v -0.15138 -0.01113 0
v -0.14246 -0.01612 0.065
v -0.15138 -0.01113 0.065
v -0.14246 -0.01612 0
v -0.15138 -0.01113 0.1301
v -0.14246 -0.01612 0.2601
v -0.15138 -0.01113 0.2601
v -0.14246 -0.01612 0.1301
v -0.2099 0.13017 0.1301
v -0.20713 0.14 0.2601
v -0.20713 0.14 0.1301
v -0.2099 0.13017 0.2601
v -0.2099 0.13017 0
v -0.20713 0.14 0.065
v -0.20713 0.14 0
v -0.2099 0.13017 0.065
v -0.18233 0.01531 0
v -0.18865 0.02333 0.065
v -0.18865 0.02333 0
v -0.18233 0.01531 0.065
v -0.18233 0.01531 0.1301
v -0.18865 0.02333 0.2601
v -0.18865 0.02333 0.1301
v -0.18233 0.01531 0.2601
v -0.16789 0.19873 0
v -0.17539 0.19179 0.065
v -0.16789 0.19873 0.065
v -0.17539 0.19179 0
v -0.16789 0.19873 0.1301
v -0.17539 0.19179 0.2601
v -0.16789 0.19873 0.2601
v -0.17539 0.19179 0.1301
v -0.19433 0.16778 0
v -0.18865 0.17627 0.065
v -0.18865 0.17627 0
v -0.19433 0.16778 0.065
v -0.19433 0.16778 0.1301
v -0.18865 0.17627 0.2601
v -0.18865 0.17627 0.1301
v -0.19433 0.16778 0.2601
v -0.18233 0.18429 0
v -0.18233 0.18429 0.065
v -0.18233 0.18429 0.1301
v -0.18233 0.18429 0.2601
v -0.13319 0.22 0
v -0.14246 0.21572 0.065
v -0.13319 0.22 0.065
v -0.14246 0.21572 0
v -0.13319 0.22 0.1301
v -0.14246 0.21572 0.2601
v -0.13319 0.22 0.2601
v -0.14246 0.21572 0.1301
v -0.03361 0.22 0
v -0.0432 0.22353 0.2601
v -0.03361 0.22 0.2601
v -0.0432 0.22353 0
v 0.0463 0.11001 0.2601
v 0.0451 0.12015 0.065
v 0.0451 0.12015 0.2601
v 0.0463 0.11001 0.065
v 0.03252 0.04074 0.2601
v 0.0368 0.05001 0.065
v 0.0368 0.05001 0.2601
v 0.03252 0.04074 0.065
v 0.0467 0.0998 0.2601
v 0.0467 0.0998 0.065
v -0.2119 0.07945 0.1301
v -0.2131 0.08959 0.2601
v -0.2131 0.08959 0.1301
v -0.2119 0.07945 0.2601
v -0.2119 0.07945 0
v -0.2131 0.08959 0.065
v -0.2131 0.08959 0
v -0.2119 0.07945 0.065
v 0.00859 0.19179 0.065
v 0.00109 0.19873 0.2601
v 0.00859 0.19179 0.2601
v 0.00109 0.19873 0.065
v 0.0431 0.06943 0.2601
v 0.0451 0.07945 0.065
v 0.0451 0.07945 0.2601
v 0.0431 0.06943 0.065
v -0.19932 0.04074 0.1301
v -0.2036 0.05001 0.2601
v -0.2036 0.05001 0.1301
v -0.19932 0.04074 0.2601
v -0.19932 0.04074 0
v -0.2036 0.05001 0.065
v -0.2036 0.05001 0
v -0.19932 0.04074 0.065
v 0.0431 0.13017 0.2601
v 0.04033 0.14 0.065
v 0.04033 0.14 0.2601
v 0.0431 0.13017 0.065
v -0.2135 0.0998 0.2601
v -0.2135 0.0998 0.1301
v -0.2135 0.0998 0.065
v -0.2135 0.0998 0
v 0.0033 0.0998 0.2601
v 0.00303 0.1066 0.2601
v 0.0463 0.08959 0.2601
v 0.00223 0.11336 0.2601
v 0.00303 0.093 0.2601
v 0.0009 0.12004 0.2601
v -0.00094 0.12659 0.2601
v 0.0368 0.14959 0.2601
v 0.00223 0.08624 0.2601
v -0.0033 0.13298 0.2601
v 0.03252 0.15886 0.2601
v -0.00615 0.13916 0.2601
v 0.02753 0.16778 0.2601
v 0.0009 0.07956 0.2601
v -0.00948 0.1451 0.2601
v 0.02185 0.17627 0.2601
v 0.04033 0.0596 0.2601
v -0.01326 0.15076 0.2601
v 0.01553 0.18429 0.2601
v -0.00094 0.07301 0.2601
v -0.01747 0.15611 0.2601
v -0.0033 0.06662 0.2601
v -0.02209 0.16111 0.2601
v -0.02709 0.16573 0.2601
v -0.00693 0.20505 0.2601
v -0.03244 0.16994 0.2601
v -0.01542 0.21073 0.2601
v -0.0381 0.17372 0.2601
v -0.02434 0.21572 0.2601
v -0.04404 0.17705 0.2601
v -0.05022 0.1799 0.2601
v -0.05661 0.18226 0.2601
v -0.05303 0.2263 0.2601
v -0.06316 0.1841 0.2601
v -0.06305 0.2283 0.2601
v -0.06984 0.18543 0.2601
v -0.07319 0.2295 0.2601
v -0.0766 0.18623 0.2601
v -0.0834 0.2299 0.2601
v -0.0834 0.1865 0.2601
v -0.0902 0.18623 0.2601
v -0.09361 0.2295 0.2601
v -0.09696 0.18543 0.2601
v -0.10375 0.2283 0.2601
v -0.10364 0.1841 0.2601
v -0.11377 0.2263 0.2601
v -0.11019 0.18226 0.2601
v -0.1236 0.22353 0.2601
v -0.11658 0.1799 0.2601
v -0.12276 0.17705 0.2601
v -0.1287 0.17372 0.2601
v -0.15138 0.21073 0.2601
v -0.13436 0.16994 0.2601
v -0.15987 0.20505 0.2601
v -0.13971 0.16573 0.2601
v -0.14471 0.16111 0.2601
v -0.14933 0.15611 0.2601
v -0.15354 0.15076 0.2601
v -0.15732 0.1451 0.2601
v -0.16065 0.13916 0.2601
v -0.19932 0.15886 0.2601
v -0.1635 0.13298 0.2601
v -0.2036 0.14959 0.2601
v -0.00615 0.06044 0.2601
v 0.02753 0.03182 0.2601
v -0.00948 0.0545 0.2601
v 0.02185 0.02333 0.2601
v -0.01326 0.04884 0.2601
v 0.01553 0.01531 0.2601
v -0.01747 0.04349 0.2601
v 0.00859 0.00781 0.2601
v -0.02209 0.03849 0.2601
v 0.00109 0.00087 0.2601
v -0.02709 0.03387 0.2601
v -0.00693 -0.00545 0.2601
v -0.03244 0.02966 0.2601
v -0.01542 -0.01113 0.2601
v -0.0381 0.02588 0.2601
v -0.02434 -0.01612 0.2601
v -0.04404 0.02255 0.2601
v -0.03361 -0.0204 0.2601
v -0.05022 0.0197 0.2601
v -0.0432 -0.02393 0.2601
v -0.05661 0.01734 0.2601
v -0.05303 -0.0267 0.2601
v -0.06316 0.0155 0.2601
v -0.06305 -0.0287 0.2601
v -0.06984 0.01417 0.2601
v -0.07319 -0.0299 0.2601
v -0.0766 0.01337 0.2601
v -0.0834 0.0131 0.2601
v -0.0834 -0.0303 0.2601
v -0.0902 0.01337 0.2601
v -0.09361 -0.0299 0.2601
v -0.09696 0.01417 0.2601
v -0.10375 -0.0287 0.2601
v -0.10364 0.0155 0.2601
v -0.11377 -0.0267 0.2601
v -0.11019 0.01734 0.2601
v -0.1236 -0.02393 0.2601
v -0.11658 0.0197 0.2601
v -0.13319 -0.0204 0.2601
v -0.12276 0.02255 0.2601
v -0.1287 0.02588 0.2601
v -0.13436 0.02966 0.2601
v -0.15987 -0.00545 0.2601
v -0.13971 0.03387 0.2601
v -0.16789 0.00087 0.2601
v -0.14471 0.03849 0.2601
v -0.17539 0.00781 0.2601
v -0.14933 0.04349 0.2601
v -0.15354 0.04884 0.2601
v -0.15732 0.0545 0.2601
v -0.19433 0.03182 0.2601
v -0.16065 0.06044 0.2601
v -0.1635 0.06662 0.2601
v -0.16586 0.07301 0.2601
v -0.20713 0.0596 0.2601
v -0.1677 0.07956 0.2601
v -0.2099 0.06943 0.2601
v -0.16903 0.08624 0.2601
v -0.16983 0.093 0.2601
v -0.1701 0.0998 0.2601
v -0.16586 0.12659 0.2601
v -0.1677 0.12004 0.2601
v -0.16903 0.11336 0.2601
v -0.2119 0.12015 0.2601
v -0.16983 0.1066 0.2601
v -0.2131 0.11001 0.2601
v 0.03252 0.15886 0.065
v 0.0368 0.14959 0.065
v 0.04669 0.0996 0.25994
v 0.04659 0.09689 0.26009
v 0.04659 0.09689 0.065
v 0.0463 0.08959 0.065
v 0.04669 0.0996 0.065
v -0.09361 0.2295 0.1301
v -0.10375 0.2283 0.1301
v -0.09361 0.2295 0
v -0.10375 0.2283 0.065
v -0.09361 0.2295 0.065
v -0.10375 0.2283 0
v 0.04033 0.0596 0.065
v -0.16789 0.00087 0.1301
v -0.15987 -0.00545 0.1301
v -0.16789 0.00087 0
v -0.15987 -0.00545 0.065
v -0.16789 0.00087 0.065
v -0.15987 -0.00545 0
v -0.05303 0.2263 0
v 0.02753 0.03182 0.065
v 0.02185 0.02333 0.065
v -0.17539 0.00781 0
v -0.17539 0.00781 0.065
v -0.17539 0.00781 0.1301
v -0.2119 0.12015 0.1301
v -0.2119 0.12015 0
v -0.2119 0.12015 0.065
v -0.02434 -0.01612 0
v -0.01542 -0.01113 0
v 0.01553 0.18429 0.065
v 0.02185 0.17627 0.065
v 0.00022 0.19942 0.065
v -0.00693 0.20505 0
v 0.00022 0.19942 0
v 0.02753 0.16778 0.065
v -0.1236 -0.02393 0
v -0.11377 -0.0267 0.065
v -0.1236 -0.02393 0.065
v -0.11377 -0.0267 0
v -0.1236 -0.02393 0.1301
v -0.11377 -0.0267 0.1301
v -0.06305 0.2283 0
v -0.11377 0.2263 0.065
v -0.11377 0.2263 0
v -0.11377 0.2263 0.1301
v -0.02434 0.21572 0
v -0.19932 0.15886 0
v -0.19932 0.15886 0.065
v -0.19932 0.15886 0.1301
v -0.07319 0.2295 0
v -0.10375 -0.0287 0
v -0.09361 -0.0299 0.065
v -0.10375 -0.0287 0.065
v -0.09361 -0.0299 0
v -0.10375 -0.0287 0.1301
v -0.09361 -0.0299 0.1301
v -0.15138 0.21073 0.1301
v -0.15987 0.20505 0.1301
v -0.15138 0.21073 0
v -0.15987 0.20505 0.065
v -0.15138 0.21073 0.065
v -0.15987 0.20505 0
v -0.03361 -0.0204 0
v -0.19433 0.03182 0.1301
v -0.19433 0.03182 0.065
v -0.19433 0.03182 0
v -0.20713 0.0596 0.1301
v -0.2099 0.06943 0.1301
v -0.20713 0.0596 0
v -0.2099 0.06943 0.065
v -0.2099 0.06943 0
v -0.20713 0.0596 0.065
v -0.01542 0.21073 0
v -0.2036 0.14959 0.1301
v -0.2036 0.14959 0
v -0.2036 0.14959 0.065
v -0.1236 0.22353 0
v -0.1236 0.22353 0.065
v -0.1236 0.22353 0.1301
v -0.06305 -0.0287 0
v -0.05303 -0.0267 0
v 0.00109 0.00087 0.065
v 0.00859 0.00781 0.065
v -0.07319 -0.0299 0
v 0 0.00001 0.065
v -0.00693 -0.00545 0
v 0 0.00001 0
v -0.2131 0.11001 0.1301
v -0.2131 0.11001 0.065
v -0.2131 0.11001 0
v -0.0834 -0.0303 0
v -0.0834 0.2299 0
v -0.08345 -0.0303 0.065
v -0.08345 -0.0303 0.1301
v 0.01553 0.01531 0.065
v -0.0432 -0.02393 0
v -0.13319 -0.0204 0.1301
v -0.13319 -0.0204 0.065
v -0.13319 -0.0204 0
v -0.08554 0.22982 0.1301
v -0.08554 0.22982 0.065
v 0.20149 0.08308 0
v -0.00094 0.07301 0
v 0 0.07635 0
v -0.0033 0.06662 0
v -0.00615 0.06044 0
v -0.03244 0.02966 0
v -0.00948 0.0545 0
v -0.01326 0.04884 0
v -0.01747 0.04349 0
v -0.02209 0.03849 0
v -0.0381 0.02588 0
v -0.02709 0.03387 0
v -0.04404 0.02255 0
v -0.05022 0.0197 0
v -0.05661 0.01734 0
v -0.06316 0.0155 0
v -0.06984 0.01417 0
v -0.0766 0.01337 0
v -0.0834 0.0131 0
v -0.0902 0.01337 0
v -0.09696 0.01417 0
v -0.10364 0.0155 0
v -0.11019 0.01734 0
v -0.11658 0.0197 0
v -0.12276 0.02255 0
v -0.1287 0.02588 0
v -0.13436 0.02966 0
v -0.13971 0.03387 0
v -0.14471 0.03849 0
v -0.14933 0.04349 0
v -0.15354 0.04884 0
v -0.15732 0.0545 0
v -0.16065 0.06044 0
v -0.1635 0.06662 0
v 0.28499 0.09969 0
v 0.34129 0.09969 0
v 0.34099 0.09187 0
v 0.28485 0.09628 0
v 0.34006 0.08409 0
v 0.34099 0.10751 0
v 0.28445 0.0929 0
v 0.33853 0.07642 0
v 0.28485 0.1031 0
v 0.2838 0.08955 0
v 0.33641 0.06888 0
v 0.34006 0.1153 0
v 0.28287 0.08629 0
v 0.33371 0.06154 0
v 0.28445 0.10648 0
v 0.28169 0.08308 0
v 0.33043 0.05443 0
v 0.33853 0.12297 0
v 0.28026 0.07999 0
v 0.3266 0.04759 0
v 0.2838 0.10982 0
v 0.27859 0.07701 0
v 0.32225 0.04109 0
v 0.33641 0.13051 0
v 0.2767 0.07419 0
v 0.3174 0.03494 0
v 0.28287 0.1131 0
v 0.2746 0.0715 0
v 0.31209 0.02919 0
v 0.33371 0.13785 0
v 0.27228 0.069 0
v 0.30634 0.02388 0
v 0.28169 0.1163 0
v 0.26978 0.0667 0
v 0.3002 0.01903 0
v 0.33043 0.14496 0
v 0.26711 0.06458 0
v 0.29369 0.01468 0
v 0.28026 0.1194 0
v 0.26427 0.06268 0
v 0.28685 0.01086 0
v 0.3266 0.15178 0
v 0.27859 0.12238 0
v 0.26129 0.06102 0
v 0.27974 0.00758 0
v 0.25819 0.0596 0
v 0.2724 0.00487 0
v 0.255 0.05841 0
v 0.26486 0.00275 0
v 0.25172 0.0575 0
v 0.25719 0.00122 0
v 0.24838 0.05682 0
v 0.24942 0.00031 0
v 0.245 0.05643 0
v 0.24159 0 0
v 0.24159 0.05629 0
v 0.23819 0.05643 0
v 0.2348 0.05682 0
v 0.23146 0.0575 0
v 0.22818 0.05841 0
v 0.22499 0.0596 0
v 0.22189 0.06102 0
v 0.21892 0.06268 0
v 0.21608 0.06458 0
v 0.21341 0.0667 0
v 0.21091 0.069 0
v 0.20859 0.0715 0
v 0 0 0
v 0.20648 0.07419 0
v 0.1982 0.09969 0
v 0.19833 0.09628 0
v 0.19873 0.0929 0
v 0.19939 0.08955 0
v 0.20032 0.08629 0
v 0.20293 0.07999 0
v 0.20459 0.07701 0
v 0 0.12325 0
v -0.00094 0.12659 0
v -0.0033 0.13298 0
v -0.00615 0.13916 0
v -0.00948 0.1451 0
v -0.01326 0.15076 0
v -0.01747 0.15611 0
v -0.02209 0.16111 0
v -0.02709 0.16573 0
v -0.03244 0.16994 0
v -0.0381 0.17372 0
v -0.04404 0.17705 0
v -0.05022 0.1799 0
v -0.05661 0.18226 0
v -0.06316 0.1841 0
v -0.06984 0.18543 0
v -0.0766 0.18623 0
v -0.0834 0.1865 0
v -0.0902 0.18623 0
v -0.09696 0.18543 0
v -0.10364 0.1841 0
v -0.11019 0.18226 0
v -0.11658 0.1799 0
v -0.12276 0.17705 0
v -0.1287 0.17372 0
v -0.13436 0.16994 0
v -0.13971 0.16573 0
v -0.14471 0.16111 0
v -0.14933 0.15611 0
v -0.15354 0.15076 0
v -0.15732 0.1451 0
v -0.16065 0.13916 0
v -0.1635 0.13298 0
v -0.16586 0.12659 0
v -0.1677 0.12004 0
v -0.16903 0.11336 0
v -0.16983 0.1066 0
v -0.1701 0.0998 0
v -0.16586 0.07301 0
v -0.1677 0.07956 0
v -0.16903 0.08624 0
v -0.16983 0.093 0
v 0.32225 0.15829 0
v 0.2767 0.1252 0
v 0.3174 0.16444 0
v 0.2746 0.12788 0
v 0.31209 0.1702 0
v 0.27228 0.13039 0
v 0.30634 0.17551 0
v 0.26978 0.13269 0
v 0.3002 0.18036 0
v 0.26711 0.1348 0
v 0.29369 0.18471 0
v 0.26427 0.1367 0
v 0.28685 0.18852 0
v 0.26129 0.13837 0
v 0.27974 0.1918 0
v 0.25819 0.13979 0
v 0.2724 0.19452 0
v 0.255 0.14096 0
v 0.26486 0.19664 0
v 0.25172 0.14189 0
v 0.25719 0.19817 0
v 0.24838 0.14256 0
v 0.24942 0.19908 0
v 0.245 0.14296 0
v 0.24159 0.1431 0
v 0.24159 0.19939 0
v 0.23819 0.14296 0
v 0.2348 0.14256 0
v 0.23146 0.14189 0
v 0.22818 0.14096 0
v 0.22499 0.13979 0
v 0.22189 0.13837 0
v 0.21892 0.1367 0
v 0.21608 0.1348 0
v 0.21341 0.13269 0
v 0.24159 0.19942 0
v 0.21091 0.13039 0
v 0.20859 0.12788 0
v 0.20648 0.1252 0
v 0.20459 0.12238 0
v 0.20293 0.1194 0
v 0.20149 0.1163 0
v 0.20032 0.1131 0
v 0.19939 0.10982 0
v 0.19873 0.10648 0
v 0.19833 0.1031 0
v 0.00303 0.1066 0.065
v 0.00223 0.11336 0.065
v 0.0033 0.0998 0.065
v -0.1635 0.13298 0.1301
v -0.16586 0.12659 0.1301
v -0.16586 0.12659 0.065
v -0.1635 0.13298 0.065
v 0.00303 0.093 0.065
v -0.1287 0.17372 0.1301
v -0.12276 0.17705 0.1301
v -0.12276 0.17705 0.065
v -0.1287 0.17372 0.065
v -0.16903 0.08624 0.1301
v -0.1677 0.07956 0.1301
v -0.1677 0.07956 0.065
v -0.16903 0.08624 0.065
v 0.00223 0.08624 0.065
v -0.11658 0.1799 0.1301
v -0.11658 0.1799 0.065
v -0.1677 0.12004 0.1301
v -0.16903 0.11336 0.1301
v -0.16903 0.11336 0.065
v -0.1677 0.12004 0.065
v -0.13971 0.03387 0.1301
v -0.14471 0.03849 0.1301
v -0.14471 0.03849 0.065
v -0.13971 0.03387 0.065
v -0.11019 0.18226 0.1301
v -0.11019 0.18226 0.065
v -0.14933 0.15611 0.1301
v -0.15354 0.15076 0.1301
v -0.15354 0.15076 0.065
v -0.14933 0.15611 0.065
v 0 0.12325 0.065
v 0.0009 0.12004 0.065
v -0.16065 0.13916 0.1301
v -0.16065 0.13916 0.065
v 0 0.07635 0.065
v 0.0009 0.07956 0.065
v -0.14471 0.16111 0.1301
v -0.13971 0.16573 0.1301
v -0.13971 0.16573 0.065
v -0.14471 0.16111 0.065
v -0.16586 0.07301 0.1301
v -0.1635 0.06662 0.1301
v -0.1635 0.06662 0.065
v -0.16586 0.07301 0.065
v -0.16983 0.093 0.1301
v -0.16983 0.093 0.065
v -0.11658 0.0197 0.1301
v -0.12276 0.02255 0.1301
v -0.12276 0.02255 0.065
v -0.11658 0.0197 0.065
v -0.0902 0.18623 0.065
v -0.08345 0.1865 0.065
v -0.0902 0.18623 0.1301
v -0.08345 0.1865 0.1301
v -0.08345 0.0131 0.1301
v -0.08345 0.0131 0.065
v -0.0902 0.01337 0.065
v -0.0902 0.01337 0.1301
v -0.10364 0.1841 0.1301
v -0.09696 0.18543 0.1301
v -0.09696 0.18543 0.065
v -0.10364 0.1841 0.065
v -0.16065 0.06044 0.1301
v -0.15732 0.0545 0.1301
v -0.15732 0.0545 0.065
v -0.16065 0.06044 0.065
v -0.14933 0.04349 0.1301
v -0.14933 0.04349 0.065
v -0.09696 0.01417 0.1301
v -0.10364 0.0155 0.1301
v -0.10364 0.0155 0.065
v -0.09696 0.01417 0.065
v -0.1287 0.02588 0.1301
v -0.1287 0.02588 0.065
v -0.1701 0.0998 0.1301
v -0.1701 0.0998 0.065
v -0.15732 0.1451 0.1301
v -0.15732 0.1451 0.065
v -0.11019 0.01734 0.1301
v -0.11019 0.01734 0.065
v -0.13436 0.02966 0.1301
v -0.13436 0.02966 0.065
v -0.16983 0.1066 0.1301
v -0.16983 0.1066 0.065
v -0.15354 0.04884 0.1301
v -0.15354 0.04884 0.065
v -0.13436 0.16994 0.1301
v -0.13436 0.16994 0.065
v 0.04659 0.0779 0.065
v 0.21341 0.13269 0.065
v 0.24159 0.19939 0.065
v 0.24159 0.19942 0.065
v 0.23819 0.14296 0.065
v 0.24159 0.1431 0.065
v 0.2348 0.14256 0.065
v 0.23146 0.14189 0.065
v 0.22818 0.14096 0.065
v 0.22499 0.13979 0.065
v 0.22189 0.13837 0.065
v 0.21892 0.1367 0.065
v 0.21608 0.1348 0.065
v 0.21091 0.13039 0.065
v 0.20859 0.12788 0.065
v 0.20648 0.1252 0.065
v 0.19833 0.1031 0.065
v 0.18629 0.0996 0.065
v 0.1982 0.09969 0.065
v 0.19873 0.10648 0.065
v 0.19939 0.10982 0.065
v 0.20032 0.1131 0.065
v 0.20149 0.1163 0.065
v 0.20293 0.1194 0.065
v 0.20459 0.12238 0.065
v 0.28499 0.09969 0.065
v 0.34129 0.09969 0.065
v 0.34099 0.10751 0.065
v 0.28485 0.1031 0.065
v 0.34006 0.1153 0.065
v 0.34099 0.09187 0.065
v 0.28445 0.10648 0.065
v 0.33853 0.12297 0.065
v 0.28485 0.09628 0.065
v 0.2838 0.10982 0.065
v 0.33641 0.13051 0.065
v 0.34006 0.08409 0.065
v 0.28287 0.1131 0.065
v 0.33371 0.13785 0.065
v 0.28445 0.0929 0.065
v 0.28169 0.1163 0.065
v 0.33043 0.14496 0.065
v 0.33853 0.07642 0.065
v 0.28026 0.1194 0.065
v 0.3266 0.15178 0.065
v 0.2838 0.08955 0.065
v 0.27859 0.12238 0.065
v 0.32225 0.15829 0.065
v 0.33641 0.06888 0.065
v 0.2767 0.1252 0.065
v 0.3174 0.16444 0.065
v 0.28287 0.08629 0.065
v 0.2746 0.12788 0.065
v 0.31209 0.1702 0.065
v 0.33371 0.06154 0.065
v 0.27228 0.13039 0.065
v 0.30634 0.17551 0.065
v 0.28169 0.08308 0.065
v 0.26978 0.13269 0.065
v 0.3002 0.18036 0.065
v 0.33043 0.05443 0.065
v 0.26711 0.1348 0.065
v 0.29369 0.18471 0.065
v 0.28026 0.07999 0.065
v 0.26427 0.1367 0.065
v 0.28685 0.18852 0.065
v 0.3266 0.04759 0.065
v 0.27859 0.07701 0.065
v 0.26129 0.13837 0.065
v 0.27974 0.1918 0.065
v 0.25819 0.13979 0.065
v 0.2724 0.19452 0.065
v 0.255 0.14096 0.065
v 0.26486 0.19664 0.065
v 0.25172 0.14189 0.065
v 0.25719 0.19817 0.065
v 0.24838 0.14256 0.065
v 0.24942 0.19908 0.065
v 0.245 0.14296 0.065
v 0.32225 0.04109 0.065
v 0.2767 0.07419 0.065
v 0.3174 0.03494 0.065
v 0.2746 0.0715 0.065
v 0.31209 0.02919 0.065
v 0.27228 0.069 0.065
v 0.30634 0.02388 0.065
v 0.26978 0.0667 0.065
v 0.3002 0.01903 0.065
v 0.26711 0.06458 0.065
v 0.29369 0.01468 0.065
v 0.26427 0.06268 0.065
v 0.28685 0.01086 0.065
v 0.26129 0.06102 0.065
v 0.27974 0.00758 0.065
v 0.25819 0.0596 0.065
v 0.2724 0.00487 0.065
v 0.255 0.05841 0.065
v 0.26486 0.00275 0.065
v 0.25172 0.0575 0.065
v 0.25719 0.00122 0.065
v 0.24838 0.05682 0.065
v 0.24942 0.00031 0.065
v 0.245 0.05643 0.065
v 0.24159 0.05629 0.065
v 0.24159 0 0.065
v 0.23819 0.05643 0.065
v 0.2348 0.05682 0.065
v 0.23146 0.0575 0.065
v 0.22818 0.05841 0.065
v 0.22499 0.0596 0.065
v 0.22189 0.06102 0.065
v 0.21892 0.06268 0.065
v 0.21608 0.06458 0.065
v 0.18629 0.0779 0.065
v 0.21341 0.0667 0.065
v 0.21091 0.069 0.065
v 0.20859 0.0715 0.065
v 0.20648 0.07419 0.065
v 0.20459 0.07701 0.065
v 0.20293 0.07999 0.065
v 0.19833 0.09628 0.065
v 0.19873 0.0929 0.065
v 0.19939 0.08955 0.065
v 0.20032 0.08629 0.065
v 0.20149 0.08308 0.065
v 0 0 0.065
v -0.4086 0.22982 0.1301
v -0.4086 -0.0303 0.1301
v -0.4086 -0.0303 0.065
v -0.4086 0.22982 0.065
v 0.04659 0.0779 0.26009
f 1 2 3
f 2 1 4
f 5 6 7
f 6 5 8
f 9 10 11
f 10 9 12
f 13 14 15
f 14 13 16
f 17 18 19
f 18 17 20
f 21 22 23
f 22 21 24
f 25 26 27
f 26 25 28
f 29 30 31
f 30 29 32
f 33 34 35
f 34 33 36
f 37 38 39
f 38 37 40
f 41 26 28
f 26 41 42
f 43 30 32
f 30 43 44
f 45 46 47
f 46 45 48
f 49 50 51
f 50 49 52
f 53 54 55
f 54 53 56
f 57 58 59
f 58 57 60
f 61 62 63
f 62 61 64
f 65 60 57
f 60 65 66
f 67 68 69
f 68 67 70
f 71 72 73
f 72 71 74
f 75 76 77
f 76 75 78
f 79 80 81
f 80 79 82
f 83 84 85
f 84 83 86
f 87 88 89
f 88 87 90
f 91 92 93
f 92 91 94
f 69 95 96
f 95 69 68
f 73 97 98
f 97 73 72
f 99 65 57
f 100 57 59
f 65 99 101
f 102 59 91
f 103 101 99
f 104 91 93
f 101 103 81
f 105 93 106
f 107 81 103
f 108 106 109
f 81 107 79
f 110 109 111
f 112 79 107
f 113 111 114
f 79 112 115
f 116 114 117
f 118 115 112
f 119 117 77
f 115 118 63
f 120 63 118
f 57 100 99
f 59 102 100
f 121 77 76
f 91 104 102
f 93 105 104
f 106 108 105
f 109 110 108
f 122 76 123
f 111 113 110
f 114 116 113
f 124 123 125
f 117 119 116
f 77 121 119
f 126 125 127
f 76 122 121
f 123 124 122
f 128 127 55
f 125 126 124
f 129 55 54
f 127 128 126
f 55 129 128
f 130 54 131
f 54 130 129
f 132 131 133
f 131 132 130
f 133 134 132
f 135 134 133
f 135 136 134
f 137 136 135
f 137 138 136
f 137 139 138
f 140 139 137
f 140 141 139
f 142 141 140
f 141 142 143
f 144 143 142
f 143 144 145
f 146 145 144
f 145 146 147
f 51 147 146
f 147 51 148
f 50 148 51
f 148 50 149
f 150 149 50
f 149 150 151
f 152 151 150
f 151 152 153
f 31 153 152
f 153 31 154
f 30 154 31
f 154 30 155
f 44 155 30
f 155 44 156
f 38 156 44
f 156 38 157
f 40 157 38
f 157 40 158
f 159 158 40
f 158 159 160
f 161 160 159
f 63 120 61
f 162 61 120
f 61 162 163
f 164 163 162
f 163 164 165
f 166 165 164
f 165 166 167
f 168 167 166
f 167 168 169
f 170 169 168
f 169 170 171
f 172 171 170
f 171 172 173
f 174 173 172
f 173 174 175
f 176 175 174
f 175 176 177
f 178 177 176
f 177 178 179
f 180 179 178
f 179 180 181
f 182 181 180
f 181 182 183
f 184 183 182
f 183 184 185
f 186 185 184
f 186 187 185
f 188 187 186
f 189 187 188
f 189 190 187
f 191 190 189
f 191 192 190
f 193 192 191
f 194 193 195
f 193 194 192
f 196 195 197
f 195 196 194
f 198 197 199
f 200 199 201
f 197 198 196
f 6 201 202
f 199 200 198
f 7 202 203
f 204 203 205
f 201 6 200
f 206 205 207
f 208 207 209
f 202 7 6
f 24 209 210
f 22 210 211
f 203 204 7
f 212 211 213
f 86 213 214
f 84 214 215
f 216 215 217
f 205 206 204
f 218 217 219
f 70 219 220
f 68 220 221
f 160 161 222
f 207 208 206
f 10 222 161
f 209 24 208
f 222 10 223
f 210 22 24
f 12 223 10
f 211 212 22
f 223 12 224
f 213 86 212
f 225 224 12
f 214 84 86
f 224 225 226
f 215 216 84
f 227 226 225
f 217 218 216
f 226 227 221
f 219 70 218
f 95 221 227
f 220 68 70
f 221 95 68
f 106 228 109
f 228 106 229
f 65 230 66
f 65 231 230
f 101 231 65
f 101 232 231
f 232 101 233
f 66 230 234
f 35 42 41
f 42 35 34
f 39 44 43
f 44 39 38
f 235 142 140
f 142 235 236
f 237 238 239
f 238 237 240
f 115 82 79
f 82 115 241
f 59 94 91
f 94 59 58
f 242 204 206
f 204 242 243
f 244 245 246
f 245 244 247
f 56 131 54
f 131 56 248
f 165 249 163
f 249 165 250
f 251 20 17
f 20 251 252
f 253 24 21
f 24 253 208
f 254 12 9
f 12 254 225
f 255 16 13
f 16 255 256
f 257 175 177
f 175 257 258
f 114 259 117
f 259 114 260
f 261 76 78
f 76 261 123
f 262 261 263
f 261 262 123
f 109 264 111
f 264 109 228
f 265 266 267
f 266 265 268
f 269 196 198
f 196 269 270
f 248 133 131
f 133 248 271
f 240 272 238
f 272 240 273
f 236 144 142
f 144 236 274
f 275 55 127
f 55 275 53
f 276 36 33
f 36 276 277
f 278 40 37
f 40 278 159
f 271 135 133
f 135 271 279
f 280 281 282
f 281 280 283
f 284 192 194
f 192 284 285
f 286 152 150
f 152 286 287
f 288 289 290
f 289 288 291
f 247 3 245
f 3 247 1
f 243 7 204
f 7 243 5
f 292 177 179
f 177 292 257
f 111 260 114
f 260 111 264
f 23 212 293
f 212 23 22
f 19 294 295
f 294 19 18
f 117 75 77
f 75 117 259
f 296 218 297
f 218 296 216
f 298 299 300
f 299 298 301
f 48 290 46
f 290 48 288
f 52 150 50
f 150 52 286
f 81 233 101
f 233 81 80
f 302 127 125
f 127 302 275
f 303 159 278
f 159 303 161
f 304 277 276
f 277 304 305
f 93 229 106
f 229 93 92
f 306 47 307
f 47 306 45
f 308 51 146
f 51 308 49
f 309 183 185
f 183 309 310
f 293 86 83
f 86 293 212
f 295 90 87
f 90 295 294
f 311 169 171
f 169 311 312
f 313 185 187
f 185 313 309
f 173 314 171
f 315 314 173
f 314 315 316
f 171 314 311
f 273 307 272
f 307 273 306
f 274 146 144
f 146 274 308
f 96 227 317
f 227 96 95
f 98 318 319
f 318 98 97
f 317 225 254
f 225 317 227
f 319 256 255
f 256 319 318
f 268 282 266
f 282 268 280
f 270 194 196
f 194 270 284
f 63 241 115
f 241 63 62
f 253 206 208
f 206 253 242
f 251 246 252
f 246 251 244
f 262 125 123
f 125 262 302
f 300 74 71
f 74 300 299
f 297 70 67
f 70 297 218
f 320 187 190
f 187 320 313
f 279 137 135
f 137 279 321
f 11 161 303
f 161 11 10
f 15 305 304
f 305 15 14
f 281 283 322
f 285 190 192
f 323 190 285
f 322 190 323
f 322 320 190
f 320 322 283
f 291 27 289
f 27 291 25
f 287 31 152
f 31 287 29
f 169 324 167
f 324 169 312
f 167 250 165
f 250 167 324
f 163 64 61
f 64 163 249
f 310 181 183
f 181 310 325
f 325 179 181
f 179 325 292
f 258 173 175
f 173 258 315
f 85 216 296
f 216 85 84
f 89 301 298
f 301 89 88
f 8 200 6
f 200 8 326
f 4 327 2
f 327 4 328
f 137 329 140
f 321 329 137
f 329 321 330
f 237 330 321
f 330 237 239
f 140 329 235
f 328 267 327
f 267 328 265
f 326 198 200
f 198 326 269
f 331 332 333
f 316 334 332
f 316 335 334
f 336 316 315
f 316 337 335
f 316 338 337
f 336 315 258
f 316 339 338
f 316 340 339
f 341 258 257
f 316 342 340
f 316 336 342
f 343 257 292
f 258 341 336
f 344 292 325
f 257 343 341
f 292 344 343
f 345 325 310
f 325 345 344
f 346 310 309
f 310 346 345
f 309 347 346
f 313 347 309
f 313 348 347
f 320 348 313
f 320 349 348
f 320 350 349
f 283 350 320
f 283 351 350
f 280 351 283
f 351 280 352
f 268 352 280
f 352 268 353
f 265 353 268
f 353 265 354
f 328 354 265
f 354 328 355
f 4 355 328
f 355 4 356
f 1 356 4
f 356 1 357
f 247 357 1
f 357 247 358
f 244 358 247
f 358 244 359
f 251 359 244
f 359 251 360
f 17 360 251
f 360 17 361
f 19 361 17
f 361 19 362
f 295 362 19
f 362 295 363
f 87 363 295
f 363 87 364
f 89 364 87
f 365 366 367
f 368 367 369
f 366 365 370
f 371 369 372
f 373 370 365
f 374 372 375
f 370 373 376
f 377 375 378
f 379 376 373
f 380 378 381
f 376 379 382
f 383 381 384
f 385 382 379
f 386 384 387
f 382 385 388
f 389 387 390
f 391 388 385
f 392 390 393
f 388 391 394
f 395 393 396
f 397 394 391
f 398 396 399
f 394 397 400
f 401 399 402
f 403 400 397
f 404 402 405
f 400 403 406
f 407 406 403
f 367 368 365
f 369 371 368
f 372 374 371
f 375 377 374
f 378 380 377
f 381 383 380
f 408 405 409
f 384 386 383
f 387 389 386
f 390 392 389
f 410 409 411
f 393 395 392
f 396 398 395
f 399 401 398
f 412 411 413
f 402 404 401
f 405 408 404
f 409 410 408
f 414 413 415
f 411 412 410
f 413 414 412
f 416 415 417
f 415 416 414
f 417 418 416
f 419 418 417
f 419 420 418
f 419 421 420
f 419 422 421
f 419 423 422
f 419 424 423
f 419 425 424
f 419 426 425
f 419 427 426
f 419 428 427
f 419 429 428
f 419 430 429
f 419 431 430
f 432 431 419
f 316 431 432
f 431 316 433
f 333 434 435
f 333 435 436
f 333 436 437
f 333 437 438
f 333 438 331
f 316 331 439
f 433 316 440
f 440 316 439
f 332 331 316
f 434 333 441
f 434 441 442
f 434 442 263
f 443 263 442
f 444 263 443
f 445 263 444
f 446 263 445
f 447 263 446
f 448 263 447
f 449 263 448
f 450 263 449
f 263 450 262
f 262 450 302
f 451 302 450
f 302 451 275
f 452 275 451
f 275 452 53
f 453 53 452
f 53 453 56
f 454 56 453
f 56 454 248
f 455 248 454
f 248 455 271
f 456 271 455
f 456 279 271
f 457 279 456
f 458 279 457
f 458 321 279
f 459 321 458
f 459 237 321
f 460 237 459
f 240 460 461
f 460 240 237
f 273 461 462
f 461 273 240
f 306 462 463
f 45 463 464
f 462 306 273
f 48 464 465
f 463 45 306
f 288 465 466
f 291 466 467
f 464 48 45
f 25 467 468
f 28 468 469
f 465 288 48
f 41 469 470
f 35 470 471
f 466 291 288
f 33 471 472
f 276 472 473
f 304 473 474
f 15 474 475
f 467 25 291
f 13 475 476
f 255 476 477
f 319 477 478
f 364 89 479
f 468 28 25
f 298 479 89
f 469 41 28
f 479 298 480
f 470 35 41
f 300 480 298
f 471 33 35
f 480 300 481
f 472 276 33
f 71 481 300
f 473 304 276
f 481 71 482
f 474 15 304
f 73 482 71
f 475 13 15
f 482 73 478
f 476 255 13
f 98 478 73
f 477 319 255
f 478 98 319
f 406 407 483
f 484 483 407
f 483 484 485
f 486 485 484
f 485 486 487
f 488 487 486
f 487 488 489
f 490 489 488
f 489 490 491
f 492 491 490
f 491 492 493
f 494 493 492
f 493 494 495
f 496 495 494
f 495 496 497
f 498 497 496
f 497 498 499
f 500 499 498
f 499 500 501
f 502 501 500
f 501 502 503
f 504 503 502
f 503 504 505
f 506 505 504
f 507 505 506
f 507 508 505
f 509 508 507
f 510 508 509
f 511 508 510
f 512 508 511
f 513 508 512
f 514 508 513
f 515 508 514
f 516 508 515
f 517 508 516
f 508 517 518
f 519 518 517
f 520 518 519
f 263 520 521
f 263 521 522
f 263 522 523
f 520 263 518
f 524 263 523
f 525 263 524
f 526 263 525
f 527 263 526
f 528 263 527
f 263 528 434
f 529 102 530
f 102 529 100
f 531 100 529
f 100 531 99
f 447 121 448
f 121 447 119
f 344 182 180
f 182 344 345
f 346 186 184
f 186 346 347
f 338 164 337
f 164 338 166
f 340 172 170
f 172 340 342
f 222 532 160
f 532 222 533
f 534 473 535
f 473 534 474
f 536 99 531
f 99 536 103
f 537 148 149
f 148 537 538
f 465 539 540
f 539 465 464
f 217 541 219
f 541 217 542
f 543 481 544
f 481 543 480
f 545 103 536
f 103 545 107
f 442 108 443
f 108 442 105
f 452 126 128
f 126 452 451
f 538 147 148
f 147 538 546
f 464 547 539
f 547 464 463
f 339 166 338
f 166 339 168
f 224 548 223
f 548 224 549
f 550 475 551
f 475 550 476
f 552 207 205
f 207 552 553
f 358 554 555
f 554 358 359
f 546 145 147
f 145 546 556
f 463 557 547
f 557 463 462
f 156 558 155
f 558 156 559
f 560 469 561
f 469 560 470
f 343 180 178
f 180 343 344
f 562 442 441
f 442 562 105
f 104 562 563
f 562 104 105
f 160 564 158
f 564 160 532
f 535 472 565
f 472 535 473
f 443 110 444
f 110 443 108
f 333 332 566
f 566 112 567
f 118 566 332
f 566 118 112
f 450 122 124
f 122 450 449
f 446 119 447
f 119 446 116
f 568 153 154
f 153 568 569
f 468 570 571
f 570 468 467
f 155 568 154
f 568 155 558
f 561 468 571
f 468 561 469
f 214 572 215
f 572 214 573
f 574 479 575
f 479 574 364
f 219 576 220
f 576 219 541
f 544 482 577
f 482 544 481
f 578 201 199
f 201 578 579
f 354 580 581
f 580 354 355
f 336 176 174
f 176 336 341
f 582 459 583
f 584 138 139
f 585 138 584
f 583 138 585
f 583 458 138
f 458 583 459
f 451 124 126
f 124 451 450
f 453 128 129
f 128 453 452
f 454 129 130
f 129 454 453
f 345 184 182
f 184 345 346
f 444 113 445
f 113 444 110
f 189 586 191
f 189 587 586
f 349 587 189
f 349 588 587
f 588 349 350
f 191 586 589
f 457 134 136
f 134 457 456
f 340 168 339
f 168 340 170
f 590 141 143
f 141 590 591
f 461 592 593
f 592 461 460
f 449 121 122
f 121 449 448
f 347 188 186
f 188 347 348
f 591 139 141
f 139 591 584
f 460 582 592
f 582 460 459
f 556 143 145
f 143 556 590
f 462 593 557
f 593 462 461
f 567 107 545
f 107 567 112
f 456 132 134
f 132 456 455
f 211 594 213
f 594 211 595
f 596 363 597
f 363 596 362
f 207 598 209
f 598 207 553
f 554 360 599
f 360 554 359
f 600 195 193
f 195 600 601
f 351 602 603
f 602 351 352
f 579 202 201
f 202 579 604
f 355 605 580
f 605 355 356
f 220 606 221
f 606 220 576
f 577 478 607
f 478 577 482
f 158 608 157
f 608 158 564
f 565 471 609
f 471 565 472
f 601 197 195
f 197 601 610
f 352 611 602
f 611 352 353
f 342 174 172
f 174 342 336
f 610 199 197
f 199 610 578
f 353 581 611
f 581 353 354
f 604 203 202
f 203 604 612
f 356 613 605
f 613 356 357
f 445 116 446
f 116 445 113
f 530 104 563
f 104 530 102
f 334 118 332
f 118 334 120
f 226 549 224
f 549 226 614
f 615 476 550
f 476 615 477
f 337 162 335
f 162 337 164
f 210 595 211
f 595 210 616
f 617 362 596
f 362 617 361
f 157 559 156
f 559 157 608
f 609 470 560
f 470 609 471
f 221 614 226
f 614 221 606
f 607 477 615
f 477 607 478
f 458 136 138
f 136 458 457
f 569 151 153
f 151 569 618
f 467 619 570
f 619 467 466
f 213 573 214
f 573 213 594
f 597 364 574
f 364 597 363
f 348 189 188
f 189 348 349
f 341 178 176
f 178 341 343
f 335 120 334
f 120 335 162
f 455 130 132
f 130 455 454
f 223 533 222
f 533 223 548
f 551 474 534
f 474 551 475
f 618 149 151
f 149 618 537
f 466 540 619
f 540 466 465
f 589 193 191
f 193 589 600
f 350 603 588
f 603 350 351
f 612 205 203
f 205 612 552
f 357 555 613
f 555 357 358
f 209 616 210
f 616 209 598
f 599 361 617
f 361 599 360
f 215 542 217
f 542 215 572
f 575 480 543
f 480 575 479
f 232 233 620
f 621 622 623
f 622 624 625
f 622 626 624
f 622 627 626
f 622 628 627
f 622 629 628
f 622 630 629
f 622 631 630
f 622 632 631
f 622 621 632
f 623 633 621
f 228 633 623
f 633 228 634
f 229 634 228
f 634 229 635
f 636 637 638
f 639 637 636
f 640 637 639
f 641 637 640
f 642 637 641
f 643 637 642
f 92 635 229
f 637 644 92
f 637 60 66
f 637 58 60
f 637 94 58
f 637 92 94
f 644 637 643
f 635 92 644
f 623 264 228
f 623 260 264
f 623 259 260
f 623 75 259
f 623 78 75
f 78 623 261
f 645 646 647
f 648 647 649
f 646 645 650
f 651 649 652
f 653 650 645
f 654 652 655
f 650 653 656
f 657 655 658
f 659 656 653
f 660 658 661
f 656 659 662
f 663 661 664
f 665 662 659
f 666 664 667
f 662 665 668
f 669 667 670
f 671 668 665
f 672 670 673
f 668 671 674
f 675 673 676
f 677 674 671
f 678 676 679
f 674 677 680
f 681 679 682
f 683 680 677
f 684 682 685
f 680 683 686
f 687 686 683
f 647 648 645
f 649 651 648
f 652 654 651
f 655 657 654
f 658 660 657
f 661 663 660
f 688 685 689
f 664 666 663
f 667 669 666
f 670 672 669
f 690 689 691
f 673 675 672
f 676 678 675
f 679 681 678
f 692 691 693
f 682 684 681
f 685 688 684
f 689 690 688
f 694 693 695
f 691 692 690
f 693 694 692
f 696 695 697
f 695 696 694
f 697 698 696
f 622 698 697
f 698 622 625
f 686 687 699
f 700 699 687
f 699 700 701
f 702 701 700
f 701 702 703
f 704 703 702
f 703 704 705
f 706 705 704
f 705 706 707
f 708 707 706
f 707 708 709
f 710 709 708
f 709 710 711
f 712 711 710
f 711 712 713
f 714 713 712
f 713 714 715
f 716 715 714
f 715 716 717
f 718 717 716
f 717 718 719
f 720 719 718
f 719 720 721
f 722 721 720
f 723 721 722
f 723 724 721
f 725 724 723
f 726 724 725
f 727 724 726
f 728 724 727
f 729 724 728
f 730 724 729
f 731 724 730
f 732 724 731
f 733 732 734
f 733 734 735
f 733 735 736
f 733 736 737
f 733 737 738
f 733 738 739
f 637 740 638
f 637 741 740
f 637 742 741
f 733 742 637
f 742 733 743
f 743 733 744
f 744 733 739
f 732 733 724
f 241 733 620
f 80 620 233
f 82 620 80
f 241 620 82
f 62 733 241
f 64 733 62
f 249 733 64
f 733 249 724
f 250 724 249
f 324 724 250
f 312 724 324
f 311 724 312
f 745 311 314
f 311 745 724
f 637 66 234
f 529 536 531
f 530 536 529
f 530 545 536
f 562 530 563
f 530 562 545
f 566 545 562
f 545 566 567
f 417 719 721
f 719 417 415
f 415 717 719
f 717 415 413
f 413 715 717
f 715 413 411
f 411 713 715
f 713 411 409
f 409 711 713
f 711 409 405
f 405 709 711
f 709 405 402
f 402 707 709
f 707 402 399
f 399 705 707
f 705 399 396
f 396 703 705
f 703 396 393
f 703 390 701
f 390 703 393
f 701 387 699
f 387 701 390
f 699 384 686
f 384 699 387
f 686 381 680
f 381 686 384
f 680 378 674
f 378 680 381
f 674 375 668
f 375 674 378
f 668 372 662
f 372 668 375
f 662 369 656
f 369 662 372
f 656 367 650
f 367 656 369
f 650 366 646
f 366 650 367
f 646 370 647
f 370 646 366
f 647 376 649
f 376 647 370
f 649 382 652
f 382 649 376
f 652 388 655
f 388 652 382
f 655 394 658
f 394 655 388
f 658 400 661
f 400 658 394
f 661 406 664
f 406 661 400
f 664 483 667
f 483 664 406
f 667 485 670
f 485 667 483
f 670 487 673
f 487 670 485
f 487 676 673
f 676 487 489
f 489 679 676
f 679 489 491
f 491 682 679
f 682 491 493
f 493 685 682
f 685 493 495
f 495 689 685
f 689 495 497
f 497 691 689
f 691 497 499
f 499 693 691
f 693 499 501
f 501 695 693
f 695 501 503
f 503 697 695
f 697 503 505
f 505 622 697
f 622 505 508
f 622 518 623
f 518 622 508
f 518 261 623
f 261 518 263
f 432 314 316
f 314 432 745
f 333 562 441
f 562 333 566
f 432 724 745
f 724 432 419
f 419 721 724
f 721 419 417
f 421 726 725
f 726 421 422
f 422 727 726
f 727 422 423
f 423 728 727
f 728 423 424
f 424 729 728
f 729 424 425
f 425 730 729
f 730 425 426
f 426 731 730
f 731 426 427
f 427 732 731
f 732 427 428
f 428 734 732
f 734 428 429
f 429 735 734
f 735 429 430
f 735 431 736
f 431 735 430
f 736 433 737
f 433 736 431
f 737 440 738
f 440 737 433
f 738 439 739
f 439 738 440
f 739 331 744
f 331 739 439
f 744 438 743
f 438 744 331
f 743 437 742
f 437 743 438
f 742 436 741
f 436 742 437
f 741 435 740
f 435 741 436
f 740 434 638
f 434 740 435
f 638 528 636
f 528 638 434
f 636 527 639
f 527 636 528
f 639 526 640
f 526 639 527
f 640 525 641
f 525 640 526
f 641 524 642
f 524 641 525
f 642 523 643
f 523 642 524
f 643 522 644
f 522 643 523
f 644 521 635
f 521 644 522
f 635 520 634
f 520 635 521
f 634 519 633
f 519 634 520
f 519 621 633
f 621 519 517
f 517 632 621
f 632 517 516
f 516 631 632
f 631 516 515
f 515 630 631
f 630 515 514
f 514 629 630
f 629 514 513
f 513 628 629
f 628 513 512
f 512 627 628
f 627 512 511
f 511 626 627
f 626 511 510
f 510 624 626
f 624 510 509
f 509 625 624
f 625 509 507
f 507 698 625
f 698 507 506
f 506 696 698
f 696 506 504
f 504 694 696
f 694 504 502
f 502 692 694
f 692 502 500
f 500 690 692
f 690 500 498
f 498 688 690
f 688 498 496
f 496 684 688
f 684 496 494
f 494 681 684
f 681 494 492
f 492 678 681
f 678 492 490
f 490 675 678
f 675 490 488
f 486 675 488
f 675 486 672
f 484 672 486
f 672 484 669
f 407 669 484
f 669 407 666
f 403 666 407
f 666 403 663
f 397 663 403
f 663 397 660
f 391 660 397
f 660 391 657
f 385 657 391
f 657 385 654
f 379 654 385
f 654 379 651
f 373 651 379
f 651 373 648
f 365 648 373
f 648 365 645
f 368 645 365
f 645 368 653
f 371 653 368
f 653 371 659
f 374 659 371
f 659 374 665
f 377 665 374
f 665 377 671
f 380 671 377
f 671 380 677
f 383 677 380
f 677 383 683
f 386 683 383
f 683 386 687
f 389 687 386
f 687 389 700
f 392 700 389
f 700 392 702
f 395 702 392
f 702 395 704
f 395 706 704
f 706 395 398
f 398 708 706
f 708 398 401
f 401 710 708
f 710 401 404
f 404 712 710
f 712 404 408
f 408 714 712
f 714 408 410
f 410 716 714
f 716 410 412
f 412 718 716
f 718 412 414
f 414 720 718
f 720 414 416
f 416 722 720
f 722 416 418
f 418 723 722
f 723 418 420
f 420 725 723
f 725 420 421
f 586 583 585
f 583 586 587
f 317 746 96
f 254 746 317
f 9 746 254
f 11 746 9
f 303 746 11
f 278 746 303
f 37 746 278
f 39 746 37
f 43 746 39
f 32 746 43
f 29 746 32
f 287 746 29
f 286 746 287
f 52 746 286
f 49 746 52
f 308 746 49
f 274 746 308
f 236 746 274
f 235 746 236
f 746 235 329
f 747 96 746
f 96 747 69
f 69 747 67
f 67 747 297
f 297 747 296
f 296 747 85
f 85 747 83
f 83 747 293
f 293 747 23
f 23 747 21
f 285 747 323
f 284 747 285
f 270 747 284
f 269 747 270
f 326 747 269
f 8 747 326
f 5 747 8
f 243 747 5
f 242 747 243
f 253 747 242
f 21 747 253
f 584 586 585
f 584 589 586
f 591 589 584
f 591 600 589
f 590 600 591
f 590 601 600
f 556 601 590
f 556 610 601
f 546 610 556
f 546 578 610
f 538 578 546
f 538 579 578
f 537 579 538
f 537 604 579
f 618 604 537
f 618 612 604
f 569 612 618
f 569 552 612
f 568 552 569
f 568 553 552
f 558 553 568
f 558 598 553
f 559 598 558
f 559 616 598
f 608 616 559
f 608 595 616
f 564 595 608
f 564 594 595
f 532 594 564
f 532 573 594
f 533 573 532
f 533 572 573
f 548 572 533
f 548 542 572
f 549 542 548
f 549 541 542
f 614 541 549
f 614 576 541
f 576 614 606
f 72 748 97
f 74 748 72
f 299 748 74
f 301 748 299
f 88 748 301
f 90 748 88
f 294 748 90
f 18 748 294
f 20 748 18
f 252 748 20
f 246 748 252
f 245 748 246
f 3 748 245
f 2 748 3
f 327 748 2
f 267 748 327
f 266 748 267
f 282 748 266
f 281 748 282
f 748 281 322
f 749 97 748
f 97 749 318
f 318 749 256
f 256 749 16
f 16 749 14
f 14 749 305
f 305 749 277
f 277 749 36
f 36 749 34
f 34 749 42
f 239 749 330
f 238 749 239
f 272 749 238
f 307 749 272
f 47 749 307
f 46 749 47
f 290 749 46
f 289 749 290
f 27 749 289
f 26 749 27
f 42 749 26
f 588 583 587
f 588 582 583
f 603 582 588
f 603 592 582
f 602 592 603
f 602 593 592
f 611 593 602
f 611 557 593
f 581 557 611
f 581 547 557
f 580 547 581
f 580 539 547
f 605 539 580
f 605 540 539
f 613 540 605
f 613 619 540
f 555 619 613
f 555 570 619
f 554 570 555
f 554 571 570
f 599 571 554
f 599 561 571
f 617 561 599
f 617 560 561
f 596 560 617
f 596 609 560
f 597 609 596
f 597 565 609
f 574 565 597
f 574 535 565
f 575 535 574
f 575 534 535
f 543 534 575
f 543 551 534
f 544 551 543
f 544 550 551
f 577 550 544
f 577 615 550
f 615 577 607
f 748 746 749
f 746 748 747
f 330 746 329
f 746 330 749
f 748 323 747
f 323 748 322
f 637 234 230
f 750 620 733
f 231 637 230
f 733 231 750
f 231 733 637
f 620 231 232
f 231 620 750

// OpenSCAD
// Parameters
$fn = 80;

base_length = 0.341352;
base_width  = 0.199422;
base_height = 0.065029;
base_z      = 0.065;

ann_cx = 0.2416;
ann_cy = 0.0997;
ann_or = 0.0997;
ann_ir = 0.0434;

slv_cx = -0.0834;
slv_cy = 0.0998;
slv_or = 0.1301;
slv_ir = 0.0867;
slv_h  = 0.2601;
slv_span = 0.2602;

arm_l   = 0.325145;
arm_w   = 0.260116;
arm_h   = 0.130058;
arm_x0  = -0.4086;
arm_y0  = -0.0303;
arm_top = 0.1301;

web_run  = 0.108382;
web_t    = 0.0217;
web_x0   = 0.0466;
web_x1   = 0.1863;
web_y0   = 0.0781;
web_y1   = 0.0996;
web_rise = 0.195087;

eps = 0.001;

// Low rounded annular base pad with through hole
module base_plate() {
    linear_extrude(height = base_z)
    difference() {
        union() {
            square([ann_cx, base_width]);
            translate([ann_cx, ann_cy])
                circle(r = ann_or);
        }
        translate([ann_cx, ann_cy])
            circle(r = ann_ir);
    }
}

// Taller hollow sleeve
module hollow_sleeve() {
    translate([slv_cx, slv_cy, 0])
    difference() {
        cylinder(h = slv_h, r = slv_or);
        translate([0, 0, -eps])
            cylinder(h = slv_h + 2 * eps, r = slv_ir);
    }
}

// Raised straight-sided arm (lower band 0..base_z omitted)
module projecting_arm() {
    translate([arm_x0, arm_y0, base_z])
        cube([arm_l, arm_w, arm_top - base_z]);
}

// Narrow triangular web / gusset
module triangular_web() {
    translate([0, web_y1, 0])
    rotate([90, 0, 0])
    linear_extrude(height = web_t)
        polygon([
            [web_x0, base_z],
            [web_x0, slv_h],
            [web_x1, base_z]
        ]);
}

// Main model
union() {
    base_plate();
    hollow_sleeve();
    projecting_arm();
    triangular_web();
}
